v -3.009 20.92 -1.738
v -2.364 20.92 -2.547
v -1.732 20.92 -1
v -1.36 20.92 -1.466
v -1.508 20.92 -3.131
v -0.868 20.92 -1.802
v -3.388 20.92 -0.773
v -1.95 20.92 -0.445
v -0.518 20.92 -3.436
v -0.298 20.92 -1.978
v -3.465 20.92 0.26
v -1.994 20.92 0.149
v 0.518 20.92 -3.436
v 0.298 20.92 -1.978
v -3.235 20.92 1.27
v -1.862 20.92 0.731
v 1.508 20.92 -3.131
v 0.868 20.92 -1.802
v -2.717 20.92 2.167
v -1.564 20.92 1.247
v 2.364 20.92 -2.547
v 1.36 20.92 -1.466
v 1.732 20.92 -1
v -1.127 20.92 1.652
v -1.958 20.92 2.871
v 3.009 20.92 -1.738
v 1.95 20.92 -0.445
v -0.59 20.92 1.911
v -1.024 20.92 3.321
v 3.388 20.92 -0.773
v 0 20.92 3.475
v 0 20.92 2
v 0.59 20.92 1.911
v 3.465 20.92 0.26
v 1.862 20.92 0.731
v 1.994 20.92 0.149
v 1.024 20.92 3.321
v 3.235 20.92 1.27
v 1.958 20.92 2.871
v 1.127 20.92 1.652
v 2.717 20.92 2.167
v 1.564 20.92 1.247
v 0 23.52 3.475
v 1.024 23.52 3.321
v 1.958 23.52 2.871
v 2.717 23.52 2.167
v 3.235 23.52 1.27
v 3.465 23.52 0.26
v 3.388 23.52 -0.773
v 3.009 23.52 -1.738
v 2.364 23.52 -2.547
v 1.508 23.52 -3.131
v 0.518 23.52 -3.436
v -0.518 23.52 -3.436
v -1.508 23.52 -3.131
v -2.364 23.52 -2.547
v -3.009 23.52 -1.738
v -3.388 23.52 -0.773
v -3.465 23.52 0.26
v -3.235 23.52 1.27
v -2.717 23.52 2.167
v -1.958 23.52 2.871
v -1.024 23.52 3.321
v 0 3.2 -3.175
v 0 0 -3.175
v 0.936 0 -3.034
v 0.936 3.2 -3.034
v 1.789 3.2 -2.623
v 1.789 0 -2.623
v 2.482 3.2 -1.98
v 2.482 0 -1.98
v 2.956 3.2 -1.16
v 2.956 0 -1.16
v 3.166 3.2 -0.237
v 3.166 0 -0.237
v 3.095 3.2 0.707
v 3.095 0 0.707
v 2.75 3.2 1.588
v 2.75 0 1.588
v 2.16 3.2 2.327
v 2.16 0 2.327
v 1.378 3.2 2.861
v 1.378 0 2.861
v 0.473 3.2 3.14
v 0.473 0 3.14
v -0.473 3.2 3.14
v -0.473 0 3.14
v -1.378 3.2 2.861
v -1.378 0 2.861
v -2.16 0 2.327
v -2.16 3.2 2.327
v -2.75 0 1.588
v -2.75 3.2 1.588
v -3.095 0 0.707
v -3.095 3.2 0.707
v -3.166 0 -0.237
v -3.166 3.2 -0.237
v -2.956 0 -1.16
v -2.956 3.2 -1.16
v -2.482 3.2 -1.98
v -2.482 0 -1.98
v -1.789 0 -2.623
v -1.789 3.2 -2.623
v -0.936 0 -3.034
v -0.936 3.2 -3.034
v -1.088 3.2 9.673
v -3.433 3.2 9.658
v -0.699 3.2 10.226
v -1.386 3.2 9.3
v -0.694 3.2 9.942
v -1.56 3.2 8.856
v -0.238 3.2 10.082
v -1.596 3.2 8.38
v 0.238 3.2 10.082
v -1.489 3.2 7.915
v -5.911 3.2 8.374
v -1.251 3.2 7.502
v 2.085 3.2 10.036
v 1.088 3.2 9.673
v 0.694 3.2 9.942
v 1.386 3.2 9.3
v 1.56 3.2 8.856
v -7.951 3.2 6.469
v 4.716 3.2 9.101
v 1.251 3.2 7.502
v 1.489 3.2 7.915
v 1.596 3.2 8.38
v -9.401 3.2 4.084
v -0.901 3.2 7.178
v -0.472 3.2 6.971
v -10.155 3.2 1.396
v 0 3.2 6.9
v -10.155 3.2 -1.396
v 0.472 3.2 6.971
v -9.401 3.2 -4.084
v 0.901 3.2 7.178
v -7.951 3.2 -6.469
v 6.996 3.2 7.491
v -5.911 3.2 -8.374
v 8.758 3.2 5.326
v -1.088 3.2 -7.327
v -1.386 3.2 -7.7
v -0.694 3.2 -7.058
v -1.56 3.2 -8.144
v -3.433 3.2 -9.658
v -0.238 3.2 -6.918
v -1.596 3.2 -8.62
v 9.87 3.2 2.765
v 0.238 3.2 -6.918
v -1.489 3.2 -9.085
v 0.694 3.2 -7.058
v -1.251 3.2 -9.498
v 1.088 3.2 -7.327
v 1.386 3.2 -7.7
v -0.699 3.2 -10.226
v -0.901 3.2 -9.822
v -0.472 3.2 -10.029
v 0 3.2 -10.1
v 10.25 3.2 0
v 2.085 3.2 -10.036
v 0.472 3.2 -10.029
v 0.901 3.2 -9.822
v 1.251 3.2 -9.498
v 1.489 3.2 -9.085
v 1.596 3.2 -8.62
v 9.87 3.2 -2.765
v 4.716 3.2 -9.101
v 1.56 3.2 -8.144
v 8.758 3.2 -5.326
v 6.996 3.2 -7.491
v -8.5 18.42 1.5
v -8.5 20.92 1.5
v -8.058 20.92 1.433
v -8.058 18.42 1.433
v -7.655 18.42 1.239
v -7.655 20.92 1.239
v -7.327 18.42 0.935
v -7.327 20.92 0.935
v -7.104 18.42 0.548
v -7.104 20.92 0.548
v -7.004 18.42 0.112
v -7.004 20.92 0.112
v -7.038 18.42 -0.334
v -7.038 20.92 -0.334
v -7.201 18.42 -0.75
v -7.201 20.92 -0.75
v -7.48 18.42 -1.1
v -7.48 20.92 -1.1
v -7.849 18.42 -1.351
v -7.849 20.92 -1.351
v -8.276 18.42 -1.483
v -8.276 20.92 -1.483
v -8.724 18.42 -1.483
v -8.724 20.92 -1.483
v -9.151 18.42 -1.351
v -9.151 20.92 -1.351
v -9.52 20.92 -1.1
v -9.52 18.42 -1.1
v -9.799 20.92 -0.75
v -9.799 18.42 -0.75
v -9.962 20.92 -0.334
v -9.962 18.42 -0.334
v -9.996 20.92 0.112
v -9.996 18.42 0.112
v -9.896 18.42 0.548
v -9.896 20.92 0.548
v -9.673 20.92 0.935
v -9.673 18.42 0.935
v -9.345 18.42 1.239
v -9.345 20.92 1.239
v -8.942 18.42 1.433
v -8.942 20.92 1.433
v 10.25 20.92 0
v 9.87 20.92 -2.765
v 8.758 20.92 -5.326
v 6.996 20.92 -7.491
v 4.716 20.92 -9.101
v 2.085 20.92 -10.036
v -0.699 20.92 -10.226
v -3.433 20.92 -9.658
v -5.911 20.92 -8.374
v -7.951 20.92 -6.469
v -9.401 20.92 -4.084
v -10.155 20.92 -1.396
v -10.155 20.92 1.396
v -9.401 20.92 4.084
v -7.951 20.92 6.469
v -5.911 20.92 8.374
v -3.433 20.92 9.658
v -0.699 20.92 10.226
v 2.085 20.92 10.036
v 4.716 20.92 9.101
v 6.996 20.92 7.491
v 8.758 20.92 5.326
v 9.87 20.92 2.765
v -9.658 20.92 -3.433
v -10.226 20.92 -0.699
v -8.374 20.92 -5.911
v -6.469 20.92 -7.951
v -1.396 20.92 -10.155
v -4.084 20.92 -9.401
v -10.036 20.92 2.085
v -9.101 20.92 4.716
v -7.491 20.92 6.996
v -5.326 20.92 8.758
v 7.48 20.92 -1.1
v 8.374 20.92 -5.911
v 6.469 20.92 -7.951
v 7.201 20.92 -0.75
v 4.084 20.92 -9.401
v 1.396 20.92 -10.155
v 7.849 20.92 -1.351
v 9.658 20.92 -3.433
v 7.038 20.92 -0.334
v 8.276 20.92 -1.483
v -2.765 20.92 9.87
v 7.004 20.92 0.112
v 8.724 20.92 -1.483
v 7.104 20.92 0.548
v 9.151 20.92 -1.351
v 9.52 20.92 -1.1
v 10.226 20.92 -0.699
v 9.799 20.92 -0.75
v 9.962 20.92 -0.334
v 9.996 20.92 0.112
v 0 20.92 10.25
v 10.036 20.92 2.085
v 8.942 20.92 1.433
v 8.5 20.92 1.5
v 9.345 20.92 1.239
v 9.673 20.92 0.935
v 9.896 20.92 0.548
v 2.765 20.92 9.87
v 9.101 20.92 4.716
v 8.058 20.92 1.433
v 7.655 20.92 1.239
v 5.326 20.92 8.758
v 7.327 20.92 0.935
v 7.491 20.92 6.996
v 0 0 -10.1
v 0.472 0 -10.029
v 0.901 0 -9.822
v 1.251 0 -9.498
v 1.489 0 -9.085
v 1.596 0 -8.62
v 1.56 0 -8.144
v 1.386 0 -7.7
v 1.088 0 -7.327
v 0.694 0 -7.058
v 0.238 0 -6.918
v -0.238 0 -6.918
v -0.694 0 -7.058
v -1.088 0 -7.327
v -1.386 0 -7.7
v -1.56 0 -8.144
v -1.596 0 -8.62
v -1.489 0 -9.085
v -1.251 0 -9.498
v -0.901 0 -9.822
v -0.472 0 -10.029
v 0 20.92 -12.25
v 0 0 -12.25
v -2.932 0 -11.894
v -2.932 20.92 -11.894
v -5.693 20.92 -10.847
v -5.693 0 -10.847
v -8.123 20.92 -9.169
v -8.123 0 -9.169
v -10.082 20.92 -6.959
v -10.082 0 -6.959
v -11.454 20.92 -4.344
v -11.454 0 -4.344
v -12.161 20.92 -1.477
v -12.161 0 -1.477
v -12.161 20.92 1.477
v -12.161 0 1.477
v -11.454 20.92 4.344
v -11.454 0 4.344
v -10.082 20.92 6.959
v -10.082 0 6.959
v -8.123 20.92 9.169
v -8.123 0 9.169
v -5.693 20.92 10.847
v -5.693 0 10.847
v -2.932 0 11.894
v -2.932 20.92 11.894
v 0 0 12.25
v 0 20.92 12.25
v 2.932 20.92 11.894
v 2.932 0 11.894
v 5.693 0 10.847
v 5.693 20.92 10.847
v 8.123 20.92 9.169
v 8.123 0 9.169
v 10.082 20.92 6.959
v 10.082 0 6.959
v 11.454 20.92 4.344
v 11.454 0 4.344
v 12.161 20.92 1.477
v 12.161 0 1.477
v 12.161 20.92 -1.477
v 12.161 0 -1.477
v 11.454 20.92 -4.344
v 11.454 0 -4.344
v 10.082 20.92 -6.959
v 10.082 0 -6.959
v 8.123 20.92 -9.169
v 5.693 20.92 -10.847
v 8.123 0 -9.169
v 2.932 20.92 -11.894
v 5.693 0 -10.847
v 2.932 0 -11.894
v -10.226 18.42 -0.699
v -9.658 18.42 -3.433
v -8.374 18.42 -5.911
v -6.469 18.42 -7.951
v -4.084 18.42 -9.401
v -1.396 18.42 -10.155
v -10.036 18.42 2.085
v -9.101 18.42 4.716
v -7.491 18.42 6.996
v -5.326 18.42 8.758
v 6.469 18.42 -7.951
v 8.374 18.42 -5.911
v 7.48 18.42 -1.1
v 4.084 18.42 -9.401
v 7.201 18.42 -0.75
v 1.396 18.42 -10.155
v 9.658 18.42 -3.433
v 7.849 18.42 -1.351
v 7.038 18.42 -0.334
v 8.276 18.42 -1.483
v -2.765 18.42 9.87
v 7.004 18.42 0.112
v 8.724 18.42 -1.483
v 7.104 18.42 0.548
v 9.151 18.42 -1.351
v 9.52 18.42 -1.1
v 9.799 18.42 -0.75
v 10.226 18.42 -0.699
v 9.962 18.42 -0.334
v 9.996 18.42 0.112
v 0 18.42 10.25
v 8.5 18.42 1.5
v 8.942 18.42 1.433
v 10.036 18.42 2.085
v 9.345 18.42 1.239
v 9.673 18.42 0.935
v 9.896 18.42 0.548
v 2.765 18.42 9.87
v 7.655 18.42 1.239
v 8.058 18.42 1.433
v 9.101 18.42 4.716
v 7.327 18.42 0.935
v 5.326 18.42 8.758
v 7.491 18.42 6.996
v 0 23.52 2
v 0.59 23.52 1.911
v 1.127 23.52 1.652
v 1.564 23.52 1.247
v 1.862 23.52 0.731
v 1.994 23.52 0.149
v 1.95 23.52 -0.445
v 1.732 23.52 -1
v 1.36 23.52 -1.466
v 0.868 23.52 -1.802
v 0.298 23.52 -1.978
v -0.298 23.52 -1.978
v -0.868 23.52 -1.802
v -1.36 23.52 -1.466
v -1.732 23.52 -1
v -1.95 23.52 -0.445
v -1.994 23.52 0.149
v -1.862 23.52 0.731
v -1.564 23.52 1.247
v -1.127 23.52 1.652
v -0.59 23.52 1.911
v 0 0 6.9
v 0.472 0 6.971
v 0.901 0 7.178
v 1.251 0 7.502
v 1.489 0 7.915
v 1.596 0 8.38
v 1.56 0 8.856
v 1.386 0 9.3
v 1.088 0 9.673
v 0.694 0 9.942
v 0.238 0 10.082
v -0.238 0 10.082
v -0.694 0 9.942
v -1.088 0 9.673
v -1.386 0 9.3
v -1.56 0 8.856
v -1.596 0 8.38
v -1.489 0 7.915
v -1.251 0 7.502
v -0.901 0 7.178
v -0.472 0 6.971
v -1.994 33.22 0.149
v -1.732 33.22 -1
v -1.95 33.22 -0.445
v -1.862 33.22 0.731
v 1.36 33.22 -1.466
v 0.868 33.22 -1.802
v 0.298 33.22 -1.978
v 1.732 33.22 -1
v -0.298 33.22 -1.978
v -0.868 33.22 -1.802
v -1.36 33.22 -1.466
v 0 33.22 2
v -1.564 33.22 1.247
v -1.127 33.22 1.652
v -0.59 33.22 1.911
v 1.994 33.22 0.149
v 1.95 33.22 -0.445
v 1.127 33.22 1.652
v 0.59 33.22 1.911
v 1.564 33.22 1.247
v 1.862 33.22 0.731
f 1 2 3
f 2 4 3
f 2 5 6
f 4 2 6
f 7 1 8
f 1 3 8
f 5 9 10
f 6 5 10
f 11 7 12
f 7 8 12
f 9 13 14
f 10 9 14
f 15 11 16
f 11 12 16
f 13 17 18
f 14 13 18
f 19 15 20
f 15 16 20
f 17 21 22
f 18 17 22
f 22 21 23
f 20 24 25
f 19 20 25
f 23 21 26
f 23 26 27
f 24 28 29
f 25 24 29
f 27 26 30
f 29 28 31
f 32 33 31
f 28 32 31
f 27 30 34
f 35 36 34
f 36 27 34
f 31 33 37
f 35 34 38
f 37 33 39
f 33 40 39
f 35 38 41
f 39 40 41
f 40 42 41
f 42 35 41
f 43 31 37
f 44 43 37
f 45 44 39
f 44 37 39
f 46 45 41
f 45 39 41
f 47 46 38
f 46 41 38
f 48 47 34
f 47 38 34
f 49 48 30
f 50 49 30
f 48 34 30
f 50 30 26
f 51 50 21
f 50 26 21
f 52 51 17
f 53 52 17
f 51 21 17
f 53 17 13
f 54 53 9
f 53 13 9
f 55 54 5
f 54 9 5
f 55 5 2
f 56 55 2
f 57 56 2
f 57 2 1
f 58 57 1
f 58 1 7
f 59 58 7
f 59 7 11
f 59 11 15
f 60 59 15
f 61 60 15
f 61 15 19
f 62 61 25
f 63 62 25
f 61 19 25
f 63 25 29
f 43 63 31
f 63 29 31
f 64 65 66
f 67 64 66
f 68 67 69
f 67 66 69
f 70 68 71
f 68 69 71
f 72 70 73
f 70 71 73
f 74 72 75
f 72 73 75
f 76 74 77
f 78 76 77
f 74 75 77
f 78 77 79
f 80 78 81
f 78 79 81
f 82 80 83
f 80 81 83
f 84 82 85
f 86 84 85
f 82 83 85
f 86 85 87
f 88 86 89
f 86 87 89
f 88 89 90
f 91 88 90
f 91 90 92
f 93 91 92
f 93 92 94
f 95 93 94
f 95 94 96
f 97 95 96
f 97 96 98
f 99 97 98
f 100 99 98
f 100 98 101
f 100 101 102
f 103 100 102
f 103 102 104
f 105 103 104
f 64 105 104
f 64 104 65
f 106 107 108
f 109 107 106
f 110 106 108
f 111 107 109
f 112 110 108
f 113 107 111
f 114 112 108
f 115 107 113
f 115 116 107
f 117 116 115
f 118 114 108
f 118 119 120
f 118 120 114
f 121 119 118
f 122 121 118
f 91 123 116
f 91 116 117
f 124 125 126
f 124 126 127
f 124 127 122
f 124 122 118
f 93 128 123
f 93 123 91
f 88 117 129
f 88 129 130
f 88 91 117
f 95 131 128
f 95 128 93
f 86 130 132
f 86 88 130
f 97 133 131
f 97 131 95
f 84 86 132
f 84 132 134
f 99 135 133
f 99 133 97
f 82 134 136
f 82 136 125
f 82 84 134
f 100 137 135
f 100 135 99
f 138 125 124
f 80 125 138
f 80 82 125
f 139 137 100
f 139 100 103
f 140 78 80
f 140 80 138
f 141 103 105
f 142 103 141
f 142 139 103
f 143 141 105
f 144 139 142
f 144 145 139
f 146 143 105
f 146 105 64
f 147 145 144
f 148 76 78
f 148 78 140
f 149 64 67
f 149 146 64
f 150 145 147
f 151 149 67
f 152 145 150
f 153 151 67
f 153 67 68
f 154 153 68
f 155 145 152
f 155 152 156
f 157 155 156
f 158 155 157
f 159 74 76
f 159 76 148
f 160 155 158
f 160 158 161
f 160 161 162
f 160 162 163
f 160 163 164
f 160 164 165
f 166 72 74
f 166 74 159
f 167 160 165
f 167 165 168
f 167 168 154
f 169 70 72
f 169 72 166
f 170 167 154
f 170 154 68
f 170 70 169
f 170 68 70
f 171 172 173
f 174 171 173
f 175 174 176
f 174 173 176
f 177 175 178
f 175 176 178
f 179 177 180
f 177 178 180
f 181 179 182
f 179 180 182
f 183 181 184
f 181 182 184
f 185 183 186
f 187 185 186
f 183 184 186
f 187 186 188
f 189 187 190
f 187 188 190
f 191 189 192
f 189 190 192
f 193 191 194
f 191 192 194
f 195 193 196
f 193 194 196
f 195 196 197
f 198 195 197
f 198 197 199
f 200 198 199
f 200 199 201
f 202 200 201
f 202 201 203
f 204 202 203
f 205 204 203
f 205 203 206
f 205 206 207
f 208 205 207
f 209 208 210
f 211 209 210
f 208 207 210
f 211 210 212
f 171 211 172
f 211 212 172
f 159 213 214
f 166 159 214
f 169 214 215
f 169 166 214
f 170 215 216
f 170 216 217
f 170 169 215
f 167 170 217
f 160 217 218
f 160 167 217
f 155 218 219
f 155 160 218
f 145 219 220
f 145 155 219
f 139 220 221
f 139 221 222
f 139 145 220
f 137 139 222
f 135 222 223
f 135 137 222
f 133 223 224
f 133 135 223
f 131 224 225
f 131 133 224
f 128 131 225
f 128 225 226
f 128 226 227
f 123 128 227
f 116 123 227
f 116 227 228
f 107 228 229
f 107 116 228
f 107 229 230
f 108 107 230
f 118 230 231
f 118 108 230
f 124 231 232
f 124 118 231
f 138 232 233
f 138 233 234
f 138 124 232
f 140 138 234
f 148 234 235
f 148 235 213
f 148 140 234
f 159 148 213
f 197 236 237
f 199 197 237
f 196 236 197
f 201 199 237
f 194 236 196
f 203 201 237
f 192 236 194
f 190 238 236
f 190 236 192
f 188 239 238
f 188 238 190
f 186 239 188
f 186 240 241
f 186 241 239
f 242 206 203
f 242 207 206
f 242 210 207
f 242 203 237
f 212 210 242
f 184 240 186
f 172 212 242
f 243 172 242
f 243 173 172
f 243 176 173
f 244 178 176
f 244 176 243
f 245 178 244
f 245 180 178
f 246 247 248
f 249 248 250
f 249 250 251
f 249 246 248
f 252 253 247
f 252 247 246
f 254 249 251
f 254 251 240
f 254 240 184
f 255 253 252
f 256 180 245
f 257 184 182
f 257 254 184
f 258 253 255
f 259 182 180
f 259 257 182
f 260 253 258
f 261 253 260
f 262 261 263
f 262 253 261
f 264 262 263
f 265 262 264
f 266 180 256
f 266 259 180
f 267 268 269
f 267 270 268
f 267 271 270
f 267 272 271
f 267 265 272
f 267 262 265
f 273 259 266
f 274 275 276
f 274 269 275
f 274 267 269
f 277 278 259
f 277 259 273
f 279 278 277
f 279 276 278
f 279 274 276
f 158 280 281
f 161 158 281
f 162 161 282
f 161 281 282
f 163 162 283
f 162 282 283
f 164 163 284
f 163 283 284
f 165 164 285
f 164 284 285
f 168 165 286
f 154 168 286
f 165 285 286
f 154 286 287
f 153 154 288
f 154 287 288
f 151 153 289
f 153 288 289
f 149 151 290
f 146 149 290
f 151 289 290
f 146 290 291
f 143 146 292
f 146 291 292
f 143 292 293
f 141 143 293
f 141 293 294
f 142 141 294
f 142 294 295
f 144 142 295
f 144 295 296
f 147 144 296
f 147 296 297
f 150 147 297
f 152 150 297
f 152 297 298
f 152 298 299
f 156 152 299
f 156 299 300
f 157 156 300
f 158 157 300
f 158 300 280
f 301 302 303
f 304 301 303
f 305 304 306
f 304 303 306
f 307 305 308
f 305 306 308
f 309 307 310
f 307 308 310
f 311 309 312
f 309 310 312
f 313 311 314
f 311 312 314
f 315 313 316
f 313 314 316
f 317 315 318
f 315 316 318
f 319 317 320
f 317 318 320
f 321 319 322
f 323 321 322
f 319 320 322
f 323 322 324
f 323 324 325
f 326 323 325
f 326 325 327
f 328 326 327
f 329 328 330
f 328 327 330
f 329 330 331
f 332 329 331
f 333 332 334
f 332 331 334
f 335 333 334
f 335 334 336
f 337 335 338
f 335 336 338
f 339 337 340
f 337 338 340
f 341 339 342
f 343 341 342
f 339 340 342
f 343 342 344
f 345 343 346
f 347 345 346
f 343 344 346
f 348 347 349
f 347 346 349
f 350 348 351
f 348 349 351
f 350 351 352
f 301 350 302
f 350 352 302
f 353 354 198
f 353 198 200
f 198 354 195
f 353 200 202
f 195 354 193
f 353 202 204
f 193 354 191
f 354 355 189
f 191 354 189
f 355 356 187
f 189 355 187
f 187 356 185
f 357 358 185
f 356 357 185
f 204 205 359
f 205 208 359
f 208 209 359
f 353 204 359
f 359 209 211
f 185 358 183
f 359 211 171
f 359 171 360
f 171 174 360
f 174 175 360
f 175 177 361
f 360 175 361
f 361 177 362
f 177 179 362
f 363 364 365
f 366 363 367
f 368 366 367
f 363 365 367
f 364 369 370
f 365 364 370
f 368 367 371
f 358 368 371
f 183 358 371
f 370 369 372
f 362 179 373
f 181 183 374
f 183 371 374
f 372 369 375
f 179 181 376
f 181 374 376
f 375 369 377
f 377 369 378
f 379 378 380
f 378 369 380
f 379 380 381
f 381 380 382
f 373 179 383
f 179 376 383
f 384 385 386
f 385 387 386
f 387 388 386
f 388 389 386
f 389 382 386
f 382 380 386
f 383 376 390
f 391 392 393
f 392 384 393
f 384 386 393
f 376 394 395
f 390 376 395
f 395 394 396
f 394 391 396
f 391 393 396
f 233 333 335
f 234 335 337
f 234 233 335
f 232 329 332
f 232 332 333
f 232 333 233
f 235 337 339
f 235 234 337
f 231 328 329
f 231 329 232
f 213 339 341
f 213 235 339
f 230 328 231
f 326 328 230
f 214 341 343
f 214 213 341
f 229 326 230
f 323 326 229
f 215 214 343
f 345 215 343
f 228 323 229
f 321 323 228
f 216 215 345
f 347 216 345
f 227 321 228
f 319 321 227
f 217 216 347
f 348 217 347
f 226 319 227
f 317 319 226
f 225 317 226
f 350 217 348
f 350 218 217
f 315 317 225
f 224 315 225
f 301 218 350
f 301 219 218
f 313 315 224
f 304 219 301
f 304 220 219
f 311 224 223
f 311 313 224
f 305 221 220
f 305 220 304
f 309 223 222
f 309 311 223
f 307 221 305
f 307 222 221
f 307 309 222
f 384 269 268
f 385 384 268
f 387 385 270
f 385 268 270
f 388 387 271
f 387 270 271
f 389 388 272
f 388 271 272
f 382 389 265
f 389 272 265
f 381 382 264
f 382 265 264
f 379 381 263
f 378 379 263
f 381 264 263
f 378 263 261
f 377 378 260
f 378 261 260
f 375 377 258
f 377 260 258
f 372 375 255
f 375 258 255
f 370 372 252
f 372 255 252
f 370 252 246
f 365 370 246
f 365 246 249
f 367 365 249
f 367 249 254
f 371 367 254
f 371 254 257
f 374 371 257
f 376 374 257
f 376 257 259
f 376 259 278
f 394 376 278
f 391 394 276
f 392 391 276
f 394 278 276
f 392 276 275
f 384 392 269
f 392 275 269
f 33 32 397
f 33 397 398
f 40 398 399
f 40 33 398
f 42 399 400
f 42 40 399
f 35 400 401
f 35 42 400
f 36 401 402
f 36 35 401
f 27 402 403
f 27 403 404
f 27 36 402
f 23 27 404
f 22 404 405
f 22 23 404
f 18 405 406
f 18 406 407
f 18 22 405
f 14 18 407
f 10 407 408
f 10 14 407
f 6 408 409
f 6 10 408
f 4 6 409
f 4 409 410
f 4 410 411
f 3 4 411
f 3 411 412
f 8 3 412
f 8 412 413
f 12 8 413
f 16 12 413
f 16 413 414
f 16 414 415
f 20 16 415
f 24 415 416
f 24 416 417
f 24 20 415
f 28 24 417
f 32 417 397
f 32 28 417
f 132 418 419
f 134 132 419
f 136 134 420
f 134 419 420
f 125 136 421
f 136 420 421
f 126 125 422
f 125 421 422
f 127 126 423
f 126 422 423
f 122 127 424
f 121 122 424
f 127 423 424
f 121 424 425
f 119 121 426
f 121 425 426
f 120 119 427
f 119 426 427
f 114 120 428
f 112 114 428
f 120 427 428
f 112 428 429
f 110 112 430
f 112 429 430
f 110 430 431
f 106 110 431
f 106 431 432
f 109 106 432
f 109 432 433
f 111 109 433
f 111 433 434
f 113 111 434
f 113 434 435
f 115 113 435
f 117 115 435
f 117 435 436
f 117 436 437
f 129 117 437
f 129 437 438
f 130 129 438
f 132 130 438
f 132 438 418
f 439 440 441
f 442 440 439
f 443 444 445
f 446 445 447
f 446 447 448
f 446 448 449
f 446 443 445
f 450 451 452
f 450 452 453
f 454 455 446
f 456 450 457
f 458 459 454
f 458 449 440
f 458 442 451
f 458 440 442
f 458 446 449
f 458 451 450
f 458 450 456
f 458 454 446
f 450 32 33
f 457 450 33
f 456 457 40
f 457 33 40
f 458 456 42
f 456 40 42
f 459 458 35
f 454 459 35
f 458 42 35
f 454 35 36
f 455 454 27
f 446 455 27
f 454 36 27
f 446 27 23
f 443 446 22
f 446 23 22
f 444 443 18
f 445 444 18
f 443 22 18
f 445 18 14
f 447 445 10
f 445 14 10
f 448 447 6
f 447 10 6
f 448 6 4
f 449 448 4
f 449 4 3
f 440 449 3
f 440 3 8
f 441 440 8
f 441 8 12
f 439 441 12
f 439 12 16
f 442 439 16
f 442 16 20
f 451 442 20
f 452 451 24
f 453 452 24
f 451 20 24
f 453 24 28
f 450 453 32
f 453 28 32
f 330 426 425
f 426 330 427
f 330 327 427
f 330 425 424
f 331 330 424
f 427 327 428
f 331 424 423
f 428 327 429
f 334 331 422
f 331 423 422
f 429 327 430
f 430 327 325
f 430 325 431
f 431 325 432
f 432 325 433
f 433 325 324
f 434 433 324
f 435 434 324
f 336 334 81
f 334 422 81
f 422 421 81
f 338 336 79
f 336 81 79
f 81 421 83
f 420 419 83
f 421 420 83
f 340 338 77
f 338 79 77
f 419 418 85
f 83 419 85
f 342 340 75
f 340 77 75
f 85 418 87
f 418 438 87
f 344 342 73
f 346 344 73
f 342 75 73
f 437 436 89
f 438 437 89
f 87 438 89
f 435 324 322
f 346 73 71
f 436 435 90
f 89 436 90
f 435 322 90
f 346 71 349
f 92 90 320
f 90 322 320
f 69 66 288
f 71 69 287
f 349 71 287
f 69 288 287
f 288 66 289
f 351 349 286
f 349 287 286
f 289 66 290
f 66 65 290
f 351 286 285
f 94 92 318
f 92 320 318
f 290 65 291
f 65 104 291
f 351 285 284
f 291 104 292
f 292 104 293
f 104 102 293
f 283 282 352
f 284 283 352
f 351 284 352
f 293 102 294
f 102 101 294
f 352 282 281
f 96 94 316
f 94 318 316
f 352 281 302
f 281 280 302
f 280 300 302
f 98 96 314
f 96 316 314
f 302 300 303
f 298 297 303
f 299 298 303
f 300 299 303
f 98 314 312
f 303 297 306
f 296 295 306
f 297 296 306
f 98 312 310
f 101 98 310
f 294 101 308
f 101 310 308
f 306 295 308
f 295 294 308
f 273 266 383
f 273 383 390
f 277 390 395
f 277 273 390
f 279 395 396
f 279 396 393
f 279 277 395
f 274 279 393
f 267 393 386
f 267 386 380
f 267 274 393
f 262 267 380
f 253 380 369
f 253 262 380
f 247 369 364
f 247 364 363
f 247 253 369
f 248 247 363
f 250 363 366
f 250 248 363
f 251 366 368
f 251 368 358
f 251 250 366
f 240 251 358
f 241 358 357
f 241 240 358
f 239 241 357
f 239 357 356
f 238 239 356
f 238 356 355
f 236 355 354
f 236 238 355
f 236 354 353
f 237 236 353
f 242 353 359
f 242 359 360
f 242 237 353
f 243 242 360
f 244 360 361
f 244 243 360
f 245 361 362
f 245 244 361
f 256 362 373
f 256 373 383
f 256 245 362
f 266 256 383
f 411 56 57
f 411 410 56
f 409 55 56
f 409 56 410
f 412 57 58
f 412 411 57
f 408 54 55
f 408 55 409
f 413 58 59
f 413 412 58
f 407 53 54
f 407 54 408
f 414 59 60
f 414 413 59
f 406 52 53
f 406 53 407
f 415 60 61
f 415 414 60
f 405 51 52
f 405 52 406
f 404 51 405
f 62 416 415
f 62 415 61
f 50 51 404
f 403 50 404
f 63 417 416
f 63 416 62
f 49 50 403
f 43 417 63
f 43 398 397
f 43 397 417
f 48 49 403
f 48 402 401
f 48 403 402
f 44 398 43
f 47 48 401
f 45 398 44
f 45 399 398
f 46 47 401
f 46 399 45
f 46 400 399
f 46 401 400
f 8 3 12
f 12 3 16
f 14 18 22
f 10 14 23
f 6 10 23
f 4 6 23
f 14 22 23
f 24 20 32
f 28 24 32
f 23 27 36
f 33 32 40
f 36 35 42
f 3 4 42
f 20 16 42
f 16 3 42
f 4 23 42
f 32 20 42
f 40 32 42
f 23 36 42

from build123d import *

# Parameters (mm, degrees)
SKETCH1_R           = 12.25
BOSS_EXTRUDE1_DEPTH = 20.92
SHELL2_START        = 3.2
SHELL2_OUTLINE_R    = 10.25
SHELL2_DEPTH        = 17.72
SKETCH2_R           = 3.175
SKETCH2_R_2         = 1.6
CUT_EXTRUDE1_DEPTH  = 8
SKETCH3_R           = 2
BOSS_EXTRUDE2_DEPTH = 12.3
SKETCH3_3_R         = 3.475
SKETCH3_3_R_2       = 2
BOSS_EXTRUDE3_DEPTH = 2.6
SKETCH4_R           = 10.25
BOSS_EXTRUDE4_DEPTH = 2.5
SKETCH5_R           = 1.5
CUT_EXTRUDE2_DEPTH  = 2.5


# Read off the part's stored shape, not the designer's step: Shell2
with BuildPart() as part:
    # Sketch1 → Boss-Extrude1 (new body)
    with BuildSketch(Plane(origin=(0, 0, 0), x_dir=(1, 0, 0), z_dir=(0, 1, 0))):
        with Locations(Location((0, 0, 0), (0, 0, 90))):
            Circle(SKETCH1_R)
    extrude(amount=BOSS_EXTRUDE1_DEPTH)

    # Shell2 outline → Shell2 (cut)
    with BuildSketch(Plane(origin=(0, 0, 0), x_dir=(1, 0, 0), z_dir=(0, 1, 0)).offset(SHELL2_START)):
        Circle(SHELL2_OUTLINE_R)
    extrude(amount=SHELL2_DEPTH, mode=Mode.SUBTRACT)

    # Sketch2 → Cut-Extrude1 (cut)
    with BuildSketch(Plane.XZ):
        with Locations(Location((0, 0, 0), (0, 0, 270))):
            Circle(SKETCH2_R)
        with Locations(Location((0, 8.5, 0), (0, 0, 270))):
            Circle(SKETCH2_R_2)
        with Locations(Location((0, -8.5, 0), (0, 0, 270))):
            Circle(SKETCH2_R_2)
    extrude(amount=-CUT_EXTRUDE1_DEPTH, mode=Mode.SUBTRACT)


with BuildPart() as body_2:
    # Sketch3 → Boss-Extrude2 (new body)
    with BuildSketch(Plane(origin=(0, 20.92, 0), x_dir=(1, 0, 0), z_dir=(0, 1, 0))):
        with Locations(Location((0, 0, 0), (0, 0, 270))):
            Circle(SKETCH3_R)
    extrude(amount=BOSS_EXTRUDE2_DEPTH)


with BuildPart() as body_3:
    # Sketch3<3> → Boss-Extrude3 (new body)
    with BuildSketch(Plane(origin=(0, 20.92, 0), x_dir=(1, 0, 0), z_dir=(0, 1, 0))):
        with Locations(Location((0, 0, 0), (0, 0, 270))):
            Circle(SKETCH3_3_R)
        with Locations(Location((0, 0, 0), (0, 0, 270))):
            Circle(SKETCH3_3_R_2, mode=Mode.SUBTRACT)
    extrude(amount=BOSS_EXTRUDE3_DEPTH)


with BuildPart() as body_4:
    # Sketch4 → Boss-Extrude4 (new body)
    with BuildSketch(Plane(origin=(0, 20.92, 0), x_dir=(1, 0, 0), z_dir=(0, 1, 0))):
        with Locations(Location((0, 0, 0), (0, 0, 270))):
            Circle(SKETCH4_R)
    extrude(amount=-BOSS_EXTRUDE4_DEPTH)

    # Sketch5 → Cut-Extrude2 (cut)
    with BuildSketch(Plane(origin=(0, 20.92, 0), x_dir=(1, 0, 0), z_dir=(0, 1, 0))):
        with Locations(Location((-8.5, 0, 0), (0, 0, 270))):
            Circle(SKETCH5_R)
        with Locations(Location((8.5, 0, 0), (0, 0, 270))):
            Circle(SKETCH5_R)
    extrude(amount=-CUT_EXTRUDE2_DEPTH, mode=Mode.SUBTRACT)


solid = Compound([part.part, body_2.part, body_3.part, body_4.part])
